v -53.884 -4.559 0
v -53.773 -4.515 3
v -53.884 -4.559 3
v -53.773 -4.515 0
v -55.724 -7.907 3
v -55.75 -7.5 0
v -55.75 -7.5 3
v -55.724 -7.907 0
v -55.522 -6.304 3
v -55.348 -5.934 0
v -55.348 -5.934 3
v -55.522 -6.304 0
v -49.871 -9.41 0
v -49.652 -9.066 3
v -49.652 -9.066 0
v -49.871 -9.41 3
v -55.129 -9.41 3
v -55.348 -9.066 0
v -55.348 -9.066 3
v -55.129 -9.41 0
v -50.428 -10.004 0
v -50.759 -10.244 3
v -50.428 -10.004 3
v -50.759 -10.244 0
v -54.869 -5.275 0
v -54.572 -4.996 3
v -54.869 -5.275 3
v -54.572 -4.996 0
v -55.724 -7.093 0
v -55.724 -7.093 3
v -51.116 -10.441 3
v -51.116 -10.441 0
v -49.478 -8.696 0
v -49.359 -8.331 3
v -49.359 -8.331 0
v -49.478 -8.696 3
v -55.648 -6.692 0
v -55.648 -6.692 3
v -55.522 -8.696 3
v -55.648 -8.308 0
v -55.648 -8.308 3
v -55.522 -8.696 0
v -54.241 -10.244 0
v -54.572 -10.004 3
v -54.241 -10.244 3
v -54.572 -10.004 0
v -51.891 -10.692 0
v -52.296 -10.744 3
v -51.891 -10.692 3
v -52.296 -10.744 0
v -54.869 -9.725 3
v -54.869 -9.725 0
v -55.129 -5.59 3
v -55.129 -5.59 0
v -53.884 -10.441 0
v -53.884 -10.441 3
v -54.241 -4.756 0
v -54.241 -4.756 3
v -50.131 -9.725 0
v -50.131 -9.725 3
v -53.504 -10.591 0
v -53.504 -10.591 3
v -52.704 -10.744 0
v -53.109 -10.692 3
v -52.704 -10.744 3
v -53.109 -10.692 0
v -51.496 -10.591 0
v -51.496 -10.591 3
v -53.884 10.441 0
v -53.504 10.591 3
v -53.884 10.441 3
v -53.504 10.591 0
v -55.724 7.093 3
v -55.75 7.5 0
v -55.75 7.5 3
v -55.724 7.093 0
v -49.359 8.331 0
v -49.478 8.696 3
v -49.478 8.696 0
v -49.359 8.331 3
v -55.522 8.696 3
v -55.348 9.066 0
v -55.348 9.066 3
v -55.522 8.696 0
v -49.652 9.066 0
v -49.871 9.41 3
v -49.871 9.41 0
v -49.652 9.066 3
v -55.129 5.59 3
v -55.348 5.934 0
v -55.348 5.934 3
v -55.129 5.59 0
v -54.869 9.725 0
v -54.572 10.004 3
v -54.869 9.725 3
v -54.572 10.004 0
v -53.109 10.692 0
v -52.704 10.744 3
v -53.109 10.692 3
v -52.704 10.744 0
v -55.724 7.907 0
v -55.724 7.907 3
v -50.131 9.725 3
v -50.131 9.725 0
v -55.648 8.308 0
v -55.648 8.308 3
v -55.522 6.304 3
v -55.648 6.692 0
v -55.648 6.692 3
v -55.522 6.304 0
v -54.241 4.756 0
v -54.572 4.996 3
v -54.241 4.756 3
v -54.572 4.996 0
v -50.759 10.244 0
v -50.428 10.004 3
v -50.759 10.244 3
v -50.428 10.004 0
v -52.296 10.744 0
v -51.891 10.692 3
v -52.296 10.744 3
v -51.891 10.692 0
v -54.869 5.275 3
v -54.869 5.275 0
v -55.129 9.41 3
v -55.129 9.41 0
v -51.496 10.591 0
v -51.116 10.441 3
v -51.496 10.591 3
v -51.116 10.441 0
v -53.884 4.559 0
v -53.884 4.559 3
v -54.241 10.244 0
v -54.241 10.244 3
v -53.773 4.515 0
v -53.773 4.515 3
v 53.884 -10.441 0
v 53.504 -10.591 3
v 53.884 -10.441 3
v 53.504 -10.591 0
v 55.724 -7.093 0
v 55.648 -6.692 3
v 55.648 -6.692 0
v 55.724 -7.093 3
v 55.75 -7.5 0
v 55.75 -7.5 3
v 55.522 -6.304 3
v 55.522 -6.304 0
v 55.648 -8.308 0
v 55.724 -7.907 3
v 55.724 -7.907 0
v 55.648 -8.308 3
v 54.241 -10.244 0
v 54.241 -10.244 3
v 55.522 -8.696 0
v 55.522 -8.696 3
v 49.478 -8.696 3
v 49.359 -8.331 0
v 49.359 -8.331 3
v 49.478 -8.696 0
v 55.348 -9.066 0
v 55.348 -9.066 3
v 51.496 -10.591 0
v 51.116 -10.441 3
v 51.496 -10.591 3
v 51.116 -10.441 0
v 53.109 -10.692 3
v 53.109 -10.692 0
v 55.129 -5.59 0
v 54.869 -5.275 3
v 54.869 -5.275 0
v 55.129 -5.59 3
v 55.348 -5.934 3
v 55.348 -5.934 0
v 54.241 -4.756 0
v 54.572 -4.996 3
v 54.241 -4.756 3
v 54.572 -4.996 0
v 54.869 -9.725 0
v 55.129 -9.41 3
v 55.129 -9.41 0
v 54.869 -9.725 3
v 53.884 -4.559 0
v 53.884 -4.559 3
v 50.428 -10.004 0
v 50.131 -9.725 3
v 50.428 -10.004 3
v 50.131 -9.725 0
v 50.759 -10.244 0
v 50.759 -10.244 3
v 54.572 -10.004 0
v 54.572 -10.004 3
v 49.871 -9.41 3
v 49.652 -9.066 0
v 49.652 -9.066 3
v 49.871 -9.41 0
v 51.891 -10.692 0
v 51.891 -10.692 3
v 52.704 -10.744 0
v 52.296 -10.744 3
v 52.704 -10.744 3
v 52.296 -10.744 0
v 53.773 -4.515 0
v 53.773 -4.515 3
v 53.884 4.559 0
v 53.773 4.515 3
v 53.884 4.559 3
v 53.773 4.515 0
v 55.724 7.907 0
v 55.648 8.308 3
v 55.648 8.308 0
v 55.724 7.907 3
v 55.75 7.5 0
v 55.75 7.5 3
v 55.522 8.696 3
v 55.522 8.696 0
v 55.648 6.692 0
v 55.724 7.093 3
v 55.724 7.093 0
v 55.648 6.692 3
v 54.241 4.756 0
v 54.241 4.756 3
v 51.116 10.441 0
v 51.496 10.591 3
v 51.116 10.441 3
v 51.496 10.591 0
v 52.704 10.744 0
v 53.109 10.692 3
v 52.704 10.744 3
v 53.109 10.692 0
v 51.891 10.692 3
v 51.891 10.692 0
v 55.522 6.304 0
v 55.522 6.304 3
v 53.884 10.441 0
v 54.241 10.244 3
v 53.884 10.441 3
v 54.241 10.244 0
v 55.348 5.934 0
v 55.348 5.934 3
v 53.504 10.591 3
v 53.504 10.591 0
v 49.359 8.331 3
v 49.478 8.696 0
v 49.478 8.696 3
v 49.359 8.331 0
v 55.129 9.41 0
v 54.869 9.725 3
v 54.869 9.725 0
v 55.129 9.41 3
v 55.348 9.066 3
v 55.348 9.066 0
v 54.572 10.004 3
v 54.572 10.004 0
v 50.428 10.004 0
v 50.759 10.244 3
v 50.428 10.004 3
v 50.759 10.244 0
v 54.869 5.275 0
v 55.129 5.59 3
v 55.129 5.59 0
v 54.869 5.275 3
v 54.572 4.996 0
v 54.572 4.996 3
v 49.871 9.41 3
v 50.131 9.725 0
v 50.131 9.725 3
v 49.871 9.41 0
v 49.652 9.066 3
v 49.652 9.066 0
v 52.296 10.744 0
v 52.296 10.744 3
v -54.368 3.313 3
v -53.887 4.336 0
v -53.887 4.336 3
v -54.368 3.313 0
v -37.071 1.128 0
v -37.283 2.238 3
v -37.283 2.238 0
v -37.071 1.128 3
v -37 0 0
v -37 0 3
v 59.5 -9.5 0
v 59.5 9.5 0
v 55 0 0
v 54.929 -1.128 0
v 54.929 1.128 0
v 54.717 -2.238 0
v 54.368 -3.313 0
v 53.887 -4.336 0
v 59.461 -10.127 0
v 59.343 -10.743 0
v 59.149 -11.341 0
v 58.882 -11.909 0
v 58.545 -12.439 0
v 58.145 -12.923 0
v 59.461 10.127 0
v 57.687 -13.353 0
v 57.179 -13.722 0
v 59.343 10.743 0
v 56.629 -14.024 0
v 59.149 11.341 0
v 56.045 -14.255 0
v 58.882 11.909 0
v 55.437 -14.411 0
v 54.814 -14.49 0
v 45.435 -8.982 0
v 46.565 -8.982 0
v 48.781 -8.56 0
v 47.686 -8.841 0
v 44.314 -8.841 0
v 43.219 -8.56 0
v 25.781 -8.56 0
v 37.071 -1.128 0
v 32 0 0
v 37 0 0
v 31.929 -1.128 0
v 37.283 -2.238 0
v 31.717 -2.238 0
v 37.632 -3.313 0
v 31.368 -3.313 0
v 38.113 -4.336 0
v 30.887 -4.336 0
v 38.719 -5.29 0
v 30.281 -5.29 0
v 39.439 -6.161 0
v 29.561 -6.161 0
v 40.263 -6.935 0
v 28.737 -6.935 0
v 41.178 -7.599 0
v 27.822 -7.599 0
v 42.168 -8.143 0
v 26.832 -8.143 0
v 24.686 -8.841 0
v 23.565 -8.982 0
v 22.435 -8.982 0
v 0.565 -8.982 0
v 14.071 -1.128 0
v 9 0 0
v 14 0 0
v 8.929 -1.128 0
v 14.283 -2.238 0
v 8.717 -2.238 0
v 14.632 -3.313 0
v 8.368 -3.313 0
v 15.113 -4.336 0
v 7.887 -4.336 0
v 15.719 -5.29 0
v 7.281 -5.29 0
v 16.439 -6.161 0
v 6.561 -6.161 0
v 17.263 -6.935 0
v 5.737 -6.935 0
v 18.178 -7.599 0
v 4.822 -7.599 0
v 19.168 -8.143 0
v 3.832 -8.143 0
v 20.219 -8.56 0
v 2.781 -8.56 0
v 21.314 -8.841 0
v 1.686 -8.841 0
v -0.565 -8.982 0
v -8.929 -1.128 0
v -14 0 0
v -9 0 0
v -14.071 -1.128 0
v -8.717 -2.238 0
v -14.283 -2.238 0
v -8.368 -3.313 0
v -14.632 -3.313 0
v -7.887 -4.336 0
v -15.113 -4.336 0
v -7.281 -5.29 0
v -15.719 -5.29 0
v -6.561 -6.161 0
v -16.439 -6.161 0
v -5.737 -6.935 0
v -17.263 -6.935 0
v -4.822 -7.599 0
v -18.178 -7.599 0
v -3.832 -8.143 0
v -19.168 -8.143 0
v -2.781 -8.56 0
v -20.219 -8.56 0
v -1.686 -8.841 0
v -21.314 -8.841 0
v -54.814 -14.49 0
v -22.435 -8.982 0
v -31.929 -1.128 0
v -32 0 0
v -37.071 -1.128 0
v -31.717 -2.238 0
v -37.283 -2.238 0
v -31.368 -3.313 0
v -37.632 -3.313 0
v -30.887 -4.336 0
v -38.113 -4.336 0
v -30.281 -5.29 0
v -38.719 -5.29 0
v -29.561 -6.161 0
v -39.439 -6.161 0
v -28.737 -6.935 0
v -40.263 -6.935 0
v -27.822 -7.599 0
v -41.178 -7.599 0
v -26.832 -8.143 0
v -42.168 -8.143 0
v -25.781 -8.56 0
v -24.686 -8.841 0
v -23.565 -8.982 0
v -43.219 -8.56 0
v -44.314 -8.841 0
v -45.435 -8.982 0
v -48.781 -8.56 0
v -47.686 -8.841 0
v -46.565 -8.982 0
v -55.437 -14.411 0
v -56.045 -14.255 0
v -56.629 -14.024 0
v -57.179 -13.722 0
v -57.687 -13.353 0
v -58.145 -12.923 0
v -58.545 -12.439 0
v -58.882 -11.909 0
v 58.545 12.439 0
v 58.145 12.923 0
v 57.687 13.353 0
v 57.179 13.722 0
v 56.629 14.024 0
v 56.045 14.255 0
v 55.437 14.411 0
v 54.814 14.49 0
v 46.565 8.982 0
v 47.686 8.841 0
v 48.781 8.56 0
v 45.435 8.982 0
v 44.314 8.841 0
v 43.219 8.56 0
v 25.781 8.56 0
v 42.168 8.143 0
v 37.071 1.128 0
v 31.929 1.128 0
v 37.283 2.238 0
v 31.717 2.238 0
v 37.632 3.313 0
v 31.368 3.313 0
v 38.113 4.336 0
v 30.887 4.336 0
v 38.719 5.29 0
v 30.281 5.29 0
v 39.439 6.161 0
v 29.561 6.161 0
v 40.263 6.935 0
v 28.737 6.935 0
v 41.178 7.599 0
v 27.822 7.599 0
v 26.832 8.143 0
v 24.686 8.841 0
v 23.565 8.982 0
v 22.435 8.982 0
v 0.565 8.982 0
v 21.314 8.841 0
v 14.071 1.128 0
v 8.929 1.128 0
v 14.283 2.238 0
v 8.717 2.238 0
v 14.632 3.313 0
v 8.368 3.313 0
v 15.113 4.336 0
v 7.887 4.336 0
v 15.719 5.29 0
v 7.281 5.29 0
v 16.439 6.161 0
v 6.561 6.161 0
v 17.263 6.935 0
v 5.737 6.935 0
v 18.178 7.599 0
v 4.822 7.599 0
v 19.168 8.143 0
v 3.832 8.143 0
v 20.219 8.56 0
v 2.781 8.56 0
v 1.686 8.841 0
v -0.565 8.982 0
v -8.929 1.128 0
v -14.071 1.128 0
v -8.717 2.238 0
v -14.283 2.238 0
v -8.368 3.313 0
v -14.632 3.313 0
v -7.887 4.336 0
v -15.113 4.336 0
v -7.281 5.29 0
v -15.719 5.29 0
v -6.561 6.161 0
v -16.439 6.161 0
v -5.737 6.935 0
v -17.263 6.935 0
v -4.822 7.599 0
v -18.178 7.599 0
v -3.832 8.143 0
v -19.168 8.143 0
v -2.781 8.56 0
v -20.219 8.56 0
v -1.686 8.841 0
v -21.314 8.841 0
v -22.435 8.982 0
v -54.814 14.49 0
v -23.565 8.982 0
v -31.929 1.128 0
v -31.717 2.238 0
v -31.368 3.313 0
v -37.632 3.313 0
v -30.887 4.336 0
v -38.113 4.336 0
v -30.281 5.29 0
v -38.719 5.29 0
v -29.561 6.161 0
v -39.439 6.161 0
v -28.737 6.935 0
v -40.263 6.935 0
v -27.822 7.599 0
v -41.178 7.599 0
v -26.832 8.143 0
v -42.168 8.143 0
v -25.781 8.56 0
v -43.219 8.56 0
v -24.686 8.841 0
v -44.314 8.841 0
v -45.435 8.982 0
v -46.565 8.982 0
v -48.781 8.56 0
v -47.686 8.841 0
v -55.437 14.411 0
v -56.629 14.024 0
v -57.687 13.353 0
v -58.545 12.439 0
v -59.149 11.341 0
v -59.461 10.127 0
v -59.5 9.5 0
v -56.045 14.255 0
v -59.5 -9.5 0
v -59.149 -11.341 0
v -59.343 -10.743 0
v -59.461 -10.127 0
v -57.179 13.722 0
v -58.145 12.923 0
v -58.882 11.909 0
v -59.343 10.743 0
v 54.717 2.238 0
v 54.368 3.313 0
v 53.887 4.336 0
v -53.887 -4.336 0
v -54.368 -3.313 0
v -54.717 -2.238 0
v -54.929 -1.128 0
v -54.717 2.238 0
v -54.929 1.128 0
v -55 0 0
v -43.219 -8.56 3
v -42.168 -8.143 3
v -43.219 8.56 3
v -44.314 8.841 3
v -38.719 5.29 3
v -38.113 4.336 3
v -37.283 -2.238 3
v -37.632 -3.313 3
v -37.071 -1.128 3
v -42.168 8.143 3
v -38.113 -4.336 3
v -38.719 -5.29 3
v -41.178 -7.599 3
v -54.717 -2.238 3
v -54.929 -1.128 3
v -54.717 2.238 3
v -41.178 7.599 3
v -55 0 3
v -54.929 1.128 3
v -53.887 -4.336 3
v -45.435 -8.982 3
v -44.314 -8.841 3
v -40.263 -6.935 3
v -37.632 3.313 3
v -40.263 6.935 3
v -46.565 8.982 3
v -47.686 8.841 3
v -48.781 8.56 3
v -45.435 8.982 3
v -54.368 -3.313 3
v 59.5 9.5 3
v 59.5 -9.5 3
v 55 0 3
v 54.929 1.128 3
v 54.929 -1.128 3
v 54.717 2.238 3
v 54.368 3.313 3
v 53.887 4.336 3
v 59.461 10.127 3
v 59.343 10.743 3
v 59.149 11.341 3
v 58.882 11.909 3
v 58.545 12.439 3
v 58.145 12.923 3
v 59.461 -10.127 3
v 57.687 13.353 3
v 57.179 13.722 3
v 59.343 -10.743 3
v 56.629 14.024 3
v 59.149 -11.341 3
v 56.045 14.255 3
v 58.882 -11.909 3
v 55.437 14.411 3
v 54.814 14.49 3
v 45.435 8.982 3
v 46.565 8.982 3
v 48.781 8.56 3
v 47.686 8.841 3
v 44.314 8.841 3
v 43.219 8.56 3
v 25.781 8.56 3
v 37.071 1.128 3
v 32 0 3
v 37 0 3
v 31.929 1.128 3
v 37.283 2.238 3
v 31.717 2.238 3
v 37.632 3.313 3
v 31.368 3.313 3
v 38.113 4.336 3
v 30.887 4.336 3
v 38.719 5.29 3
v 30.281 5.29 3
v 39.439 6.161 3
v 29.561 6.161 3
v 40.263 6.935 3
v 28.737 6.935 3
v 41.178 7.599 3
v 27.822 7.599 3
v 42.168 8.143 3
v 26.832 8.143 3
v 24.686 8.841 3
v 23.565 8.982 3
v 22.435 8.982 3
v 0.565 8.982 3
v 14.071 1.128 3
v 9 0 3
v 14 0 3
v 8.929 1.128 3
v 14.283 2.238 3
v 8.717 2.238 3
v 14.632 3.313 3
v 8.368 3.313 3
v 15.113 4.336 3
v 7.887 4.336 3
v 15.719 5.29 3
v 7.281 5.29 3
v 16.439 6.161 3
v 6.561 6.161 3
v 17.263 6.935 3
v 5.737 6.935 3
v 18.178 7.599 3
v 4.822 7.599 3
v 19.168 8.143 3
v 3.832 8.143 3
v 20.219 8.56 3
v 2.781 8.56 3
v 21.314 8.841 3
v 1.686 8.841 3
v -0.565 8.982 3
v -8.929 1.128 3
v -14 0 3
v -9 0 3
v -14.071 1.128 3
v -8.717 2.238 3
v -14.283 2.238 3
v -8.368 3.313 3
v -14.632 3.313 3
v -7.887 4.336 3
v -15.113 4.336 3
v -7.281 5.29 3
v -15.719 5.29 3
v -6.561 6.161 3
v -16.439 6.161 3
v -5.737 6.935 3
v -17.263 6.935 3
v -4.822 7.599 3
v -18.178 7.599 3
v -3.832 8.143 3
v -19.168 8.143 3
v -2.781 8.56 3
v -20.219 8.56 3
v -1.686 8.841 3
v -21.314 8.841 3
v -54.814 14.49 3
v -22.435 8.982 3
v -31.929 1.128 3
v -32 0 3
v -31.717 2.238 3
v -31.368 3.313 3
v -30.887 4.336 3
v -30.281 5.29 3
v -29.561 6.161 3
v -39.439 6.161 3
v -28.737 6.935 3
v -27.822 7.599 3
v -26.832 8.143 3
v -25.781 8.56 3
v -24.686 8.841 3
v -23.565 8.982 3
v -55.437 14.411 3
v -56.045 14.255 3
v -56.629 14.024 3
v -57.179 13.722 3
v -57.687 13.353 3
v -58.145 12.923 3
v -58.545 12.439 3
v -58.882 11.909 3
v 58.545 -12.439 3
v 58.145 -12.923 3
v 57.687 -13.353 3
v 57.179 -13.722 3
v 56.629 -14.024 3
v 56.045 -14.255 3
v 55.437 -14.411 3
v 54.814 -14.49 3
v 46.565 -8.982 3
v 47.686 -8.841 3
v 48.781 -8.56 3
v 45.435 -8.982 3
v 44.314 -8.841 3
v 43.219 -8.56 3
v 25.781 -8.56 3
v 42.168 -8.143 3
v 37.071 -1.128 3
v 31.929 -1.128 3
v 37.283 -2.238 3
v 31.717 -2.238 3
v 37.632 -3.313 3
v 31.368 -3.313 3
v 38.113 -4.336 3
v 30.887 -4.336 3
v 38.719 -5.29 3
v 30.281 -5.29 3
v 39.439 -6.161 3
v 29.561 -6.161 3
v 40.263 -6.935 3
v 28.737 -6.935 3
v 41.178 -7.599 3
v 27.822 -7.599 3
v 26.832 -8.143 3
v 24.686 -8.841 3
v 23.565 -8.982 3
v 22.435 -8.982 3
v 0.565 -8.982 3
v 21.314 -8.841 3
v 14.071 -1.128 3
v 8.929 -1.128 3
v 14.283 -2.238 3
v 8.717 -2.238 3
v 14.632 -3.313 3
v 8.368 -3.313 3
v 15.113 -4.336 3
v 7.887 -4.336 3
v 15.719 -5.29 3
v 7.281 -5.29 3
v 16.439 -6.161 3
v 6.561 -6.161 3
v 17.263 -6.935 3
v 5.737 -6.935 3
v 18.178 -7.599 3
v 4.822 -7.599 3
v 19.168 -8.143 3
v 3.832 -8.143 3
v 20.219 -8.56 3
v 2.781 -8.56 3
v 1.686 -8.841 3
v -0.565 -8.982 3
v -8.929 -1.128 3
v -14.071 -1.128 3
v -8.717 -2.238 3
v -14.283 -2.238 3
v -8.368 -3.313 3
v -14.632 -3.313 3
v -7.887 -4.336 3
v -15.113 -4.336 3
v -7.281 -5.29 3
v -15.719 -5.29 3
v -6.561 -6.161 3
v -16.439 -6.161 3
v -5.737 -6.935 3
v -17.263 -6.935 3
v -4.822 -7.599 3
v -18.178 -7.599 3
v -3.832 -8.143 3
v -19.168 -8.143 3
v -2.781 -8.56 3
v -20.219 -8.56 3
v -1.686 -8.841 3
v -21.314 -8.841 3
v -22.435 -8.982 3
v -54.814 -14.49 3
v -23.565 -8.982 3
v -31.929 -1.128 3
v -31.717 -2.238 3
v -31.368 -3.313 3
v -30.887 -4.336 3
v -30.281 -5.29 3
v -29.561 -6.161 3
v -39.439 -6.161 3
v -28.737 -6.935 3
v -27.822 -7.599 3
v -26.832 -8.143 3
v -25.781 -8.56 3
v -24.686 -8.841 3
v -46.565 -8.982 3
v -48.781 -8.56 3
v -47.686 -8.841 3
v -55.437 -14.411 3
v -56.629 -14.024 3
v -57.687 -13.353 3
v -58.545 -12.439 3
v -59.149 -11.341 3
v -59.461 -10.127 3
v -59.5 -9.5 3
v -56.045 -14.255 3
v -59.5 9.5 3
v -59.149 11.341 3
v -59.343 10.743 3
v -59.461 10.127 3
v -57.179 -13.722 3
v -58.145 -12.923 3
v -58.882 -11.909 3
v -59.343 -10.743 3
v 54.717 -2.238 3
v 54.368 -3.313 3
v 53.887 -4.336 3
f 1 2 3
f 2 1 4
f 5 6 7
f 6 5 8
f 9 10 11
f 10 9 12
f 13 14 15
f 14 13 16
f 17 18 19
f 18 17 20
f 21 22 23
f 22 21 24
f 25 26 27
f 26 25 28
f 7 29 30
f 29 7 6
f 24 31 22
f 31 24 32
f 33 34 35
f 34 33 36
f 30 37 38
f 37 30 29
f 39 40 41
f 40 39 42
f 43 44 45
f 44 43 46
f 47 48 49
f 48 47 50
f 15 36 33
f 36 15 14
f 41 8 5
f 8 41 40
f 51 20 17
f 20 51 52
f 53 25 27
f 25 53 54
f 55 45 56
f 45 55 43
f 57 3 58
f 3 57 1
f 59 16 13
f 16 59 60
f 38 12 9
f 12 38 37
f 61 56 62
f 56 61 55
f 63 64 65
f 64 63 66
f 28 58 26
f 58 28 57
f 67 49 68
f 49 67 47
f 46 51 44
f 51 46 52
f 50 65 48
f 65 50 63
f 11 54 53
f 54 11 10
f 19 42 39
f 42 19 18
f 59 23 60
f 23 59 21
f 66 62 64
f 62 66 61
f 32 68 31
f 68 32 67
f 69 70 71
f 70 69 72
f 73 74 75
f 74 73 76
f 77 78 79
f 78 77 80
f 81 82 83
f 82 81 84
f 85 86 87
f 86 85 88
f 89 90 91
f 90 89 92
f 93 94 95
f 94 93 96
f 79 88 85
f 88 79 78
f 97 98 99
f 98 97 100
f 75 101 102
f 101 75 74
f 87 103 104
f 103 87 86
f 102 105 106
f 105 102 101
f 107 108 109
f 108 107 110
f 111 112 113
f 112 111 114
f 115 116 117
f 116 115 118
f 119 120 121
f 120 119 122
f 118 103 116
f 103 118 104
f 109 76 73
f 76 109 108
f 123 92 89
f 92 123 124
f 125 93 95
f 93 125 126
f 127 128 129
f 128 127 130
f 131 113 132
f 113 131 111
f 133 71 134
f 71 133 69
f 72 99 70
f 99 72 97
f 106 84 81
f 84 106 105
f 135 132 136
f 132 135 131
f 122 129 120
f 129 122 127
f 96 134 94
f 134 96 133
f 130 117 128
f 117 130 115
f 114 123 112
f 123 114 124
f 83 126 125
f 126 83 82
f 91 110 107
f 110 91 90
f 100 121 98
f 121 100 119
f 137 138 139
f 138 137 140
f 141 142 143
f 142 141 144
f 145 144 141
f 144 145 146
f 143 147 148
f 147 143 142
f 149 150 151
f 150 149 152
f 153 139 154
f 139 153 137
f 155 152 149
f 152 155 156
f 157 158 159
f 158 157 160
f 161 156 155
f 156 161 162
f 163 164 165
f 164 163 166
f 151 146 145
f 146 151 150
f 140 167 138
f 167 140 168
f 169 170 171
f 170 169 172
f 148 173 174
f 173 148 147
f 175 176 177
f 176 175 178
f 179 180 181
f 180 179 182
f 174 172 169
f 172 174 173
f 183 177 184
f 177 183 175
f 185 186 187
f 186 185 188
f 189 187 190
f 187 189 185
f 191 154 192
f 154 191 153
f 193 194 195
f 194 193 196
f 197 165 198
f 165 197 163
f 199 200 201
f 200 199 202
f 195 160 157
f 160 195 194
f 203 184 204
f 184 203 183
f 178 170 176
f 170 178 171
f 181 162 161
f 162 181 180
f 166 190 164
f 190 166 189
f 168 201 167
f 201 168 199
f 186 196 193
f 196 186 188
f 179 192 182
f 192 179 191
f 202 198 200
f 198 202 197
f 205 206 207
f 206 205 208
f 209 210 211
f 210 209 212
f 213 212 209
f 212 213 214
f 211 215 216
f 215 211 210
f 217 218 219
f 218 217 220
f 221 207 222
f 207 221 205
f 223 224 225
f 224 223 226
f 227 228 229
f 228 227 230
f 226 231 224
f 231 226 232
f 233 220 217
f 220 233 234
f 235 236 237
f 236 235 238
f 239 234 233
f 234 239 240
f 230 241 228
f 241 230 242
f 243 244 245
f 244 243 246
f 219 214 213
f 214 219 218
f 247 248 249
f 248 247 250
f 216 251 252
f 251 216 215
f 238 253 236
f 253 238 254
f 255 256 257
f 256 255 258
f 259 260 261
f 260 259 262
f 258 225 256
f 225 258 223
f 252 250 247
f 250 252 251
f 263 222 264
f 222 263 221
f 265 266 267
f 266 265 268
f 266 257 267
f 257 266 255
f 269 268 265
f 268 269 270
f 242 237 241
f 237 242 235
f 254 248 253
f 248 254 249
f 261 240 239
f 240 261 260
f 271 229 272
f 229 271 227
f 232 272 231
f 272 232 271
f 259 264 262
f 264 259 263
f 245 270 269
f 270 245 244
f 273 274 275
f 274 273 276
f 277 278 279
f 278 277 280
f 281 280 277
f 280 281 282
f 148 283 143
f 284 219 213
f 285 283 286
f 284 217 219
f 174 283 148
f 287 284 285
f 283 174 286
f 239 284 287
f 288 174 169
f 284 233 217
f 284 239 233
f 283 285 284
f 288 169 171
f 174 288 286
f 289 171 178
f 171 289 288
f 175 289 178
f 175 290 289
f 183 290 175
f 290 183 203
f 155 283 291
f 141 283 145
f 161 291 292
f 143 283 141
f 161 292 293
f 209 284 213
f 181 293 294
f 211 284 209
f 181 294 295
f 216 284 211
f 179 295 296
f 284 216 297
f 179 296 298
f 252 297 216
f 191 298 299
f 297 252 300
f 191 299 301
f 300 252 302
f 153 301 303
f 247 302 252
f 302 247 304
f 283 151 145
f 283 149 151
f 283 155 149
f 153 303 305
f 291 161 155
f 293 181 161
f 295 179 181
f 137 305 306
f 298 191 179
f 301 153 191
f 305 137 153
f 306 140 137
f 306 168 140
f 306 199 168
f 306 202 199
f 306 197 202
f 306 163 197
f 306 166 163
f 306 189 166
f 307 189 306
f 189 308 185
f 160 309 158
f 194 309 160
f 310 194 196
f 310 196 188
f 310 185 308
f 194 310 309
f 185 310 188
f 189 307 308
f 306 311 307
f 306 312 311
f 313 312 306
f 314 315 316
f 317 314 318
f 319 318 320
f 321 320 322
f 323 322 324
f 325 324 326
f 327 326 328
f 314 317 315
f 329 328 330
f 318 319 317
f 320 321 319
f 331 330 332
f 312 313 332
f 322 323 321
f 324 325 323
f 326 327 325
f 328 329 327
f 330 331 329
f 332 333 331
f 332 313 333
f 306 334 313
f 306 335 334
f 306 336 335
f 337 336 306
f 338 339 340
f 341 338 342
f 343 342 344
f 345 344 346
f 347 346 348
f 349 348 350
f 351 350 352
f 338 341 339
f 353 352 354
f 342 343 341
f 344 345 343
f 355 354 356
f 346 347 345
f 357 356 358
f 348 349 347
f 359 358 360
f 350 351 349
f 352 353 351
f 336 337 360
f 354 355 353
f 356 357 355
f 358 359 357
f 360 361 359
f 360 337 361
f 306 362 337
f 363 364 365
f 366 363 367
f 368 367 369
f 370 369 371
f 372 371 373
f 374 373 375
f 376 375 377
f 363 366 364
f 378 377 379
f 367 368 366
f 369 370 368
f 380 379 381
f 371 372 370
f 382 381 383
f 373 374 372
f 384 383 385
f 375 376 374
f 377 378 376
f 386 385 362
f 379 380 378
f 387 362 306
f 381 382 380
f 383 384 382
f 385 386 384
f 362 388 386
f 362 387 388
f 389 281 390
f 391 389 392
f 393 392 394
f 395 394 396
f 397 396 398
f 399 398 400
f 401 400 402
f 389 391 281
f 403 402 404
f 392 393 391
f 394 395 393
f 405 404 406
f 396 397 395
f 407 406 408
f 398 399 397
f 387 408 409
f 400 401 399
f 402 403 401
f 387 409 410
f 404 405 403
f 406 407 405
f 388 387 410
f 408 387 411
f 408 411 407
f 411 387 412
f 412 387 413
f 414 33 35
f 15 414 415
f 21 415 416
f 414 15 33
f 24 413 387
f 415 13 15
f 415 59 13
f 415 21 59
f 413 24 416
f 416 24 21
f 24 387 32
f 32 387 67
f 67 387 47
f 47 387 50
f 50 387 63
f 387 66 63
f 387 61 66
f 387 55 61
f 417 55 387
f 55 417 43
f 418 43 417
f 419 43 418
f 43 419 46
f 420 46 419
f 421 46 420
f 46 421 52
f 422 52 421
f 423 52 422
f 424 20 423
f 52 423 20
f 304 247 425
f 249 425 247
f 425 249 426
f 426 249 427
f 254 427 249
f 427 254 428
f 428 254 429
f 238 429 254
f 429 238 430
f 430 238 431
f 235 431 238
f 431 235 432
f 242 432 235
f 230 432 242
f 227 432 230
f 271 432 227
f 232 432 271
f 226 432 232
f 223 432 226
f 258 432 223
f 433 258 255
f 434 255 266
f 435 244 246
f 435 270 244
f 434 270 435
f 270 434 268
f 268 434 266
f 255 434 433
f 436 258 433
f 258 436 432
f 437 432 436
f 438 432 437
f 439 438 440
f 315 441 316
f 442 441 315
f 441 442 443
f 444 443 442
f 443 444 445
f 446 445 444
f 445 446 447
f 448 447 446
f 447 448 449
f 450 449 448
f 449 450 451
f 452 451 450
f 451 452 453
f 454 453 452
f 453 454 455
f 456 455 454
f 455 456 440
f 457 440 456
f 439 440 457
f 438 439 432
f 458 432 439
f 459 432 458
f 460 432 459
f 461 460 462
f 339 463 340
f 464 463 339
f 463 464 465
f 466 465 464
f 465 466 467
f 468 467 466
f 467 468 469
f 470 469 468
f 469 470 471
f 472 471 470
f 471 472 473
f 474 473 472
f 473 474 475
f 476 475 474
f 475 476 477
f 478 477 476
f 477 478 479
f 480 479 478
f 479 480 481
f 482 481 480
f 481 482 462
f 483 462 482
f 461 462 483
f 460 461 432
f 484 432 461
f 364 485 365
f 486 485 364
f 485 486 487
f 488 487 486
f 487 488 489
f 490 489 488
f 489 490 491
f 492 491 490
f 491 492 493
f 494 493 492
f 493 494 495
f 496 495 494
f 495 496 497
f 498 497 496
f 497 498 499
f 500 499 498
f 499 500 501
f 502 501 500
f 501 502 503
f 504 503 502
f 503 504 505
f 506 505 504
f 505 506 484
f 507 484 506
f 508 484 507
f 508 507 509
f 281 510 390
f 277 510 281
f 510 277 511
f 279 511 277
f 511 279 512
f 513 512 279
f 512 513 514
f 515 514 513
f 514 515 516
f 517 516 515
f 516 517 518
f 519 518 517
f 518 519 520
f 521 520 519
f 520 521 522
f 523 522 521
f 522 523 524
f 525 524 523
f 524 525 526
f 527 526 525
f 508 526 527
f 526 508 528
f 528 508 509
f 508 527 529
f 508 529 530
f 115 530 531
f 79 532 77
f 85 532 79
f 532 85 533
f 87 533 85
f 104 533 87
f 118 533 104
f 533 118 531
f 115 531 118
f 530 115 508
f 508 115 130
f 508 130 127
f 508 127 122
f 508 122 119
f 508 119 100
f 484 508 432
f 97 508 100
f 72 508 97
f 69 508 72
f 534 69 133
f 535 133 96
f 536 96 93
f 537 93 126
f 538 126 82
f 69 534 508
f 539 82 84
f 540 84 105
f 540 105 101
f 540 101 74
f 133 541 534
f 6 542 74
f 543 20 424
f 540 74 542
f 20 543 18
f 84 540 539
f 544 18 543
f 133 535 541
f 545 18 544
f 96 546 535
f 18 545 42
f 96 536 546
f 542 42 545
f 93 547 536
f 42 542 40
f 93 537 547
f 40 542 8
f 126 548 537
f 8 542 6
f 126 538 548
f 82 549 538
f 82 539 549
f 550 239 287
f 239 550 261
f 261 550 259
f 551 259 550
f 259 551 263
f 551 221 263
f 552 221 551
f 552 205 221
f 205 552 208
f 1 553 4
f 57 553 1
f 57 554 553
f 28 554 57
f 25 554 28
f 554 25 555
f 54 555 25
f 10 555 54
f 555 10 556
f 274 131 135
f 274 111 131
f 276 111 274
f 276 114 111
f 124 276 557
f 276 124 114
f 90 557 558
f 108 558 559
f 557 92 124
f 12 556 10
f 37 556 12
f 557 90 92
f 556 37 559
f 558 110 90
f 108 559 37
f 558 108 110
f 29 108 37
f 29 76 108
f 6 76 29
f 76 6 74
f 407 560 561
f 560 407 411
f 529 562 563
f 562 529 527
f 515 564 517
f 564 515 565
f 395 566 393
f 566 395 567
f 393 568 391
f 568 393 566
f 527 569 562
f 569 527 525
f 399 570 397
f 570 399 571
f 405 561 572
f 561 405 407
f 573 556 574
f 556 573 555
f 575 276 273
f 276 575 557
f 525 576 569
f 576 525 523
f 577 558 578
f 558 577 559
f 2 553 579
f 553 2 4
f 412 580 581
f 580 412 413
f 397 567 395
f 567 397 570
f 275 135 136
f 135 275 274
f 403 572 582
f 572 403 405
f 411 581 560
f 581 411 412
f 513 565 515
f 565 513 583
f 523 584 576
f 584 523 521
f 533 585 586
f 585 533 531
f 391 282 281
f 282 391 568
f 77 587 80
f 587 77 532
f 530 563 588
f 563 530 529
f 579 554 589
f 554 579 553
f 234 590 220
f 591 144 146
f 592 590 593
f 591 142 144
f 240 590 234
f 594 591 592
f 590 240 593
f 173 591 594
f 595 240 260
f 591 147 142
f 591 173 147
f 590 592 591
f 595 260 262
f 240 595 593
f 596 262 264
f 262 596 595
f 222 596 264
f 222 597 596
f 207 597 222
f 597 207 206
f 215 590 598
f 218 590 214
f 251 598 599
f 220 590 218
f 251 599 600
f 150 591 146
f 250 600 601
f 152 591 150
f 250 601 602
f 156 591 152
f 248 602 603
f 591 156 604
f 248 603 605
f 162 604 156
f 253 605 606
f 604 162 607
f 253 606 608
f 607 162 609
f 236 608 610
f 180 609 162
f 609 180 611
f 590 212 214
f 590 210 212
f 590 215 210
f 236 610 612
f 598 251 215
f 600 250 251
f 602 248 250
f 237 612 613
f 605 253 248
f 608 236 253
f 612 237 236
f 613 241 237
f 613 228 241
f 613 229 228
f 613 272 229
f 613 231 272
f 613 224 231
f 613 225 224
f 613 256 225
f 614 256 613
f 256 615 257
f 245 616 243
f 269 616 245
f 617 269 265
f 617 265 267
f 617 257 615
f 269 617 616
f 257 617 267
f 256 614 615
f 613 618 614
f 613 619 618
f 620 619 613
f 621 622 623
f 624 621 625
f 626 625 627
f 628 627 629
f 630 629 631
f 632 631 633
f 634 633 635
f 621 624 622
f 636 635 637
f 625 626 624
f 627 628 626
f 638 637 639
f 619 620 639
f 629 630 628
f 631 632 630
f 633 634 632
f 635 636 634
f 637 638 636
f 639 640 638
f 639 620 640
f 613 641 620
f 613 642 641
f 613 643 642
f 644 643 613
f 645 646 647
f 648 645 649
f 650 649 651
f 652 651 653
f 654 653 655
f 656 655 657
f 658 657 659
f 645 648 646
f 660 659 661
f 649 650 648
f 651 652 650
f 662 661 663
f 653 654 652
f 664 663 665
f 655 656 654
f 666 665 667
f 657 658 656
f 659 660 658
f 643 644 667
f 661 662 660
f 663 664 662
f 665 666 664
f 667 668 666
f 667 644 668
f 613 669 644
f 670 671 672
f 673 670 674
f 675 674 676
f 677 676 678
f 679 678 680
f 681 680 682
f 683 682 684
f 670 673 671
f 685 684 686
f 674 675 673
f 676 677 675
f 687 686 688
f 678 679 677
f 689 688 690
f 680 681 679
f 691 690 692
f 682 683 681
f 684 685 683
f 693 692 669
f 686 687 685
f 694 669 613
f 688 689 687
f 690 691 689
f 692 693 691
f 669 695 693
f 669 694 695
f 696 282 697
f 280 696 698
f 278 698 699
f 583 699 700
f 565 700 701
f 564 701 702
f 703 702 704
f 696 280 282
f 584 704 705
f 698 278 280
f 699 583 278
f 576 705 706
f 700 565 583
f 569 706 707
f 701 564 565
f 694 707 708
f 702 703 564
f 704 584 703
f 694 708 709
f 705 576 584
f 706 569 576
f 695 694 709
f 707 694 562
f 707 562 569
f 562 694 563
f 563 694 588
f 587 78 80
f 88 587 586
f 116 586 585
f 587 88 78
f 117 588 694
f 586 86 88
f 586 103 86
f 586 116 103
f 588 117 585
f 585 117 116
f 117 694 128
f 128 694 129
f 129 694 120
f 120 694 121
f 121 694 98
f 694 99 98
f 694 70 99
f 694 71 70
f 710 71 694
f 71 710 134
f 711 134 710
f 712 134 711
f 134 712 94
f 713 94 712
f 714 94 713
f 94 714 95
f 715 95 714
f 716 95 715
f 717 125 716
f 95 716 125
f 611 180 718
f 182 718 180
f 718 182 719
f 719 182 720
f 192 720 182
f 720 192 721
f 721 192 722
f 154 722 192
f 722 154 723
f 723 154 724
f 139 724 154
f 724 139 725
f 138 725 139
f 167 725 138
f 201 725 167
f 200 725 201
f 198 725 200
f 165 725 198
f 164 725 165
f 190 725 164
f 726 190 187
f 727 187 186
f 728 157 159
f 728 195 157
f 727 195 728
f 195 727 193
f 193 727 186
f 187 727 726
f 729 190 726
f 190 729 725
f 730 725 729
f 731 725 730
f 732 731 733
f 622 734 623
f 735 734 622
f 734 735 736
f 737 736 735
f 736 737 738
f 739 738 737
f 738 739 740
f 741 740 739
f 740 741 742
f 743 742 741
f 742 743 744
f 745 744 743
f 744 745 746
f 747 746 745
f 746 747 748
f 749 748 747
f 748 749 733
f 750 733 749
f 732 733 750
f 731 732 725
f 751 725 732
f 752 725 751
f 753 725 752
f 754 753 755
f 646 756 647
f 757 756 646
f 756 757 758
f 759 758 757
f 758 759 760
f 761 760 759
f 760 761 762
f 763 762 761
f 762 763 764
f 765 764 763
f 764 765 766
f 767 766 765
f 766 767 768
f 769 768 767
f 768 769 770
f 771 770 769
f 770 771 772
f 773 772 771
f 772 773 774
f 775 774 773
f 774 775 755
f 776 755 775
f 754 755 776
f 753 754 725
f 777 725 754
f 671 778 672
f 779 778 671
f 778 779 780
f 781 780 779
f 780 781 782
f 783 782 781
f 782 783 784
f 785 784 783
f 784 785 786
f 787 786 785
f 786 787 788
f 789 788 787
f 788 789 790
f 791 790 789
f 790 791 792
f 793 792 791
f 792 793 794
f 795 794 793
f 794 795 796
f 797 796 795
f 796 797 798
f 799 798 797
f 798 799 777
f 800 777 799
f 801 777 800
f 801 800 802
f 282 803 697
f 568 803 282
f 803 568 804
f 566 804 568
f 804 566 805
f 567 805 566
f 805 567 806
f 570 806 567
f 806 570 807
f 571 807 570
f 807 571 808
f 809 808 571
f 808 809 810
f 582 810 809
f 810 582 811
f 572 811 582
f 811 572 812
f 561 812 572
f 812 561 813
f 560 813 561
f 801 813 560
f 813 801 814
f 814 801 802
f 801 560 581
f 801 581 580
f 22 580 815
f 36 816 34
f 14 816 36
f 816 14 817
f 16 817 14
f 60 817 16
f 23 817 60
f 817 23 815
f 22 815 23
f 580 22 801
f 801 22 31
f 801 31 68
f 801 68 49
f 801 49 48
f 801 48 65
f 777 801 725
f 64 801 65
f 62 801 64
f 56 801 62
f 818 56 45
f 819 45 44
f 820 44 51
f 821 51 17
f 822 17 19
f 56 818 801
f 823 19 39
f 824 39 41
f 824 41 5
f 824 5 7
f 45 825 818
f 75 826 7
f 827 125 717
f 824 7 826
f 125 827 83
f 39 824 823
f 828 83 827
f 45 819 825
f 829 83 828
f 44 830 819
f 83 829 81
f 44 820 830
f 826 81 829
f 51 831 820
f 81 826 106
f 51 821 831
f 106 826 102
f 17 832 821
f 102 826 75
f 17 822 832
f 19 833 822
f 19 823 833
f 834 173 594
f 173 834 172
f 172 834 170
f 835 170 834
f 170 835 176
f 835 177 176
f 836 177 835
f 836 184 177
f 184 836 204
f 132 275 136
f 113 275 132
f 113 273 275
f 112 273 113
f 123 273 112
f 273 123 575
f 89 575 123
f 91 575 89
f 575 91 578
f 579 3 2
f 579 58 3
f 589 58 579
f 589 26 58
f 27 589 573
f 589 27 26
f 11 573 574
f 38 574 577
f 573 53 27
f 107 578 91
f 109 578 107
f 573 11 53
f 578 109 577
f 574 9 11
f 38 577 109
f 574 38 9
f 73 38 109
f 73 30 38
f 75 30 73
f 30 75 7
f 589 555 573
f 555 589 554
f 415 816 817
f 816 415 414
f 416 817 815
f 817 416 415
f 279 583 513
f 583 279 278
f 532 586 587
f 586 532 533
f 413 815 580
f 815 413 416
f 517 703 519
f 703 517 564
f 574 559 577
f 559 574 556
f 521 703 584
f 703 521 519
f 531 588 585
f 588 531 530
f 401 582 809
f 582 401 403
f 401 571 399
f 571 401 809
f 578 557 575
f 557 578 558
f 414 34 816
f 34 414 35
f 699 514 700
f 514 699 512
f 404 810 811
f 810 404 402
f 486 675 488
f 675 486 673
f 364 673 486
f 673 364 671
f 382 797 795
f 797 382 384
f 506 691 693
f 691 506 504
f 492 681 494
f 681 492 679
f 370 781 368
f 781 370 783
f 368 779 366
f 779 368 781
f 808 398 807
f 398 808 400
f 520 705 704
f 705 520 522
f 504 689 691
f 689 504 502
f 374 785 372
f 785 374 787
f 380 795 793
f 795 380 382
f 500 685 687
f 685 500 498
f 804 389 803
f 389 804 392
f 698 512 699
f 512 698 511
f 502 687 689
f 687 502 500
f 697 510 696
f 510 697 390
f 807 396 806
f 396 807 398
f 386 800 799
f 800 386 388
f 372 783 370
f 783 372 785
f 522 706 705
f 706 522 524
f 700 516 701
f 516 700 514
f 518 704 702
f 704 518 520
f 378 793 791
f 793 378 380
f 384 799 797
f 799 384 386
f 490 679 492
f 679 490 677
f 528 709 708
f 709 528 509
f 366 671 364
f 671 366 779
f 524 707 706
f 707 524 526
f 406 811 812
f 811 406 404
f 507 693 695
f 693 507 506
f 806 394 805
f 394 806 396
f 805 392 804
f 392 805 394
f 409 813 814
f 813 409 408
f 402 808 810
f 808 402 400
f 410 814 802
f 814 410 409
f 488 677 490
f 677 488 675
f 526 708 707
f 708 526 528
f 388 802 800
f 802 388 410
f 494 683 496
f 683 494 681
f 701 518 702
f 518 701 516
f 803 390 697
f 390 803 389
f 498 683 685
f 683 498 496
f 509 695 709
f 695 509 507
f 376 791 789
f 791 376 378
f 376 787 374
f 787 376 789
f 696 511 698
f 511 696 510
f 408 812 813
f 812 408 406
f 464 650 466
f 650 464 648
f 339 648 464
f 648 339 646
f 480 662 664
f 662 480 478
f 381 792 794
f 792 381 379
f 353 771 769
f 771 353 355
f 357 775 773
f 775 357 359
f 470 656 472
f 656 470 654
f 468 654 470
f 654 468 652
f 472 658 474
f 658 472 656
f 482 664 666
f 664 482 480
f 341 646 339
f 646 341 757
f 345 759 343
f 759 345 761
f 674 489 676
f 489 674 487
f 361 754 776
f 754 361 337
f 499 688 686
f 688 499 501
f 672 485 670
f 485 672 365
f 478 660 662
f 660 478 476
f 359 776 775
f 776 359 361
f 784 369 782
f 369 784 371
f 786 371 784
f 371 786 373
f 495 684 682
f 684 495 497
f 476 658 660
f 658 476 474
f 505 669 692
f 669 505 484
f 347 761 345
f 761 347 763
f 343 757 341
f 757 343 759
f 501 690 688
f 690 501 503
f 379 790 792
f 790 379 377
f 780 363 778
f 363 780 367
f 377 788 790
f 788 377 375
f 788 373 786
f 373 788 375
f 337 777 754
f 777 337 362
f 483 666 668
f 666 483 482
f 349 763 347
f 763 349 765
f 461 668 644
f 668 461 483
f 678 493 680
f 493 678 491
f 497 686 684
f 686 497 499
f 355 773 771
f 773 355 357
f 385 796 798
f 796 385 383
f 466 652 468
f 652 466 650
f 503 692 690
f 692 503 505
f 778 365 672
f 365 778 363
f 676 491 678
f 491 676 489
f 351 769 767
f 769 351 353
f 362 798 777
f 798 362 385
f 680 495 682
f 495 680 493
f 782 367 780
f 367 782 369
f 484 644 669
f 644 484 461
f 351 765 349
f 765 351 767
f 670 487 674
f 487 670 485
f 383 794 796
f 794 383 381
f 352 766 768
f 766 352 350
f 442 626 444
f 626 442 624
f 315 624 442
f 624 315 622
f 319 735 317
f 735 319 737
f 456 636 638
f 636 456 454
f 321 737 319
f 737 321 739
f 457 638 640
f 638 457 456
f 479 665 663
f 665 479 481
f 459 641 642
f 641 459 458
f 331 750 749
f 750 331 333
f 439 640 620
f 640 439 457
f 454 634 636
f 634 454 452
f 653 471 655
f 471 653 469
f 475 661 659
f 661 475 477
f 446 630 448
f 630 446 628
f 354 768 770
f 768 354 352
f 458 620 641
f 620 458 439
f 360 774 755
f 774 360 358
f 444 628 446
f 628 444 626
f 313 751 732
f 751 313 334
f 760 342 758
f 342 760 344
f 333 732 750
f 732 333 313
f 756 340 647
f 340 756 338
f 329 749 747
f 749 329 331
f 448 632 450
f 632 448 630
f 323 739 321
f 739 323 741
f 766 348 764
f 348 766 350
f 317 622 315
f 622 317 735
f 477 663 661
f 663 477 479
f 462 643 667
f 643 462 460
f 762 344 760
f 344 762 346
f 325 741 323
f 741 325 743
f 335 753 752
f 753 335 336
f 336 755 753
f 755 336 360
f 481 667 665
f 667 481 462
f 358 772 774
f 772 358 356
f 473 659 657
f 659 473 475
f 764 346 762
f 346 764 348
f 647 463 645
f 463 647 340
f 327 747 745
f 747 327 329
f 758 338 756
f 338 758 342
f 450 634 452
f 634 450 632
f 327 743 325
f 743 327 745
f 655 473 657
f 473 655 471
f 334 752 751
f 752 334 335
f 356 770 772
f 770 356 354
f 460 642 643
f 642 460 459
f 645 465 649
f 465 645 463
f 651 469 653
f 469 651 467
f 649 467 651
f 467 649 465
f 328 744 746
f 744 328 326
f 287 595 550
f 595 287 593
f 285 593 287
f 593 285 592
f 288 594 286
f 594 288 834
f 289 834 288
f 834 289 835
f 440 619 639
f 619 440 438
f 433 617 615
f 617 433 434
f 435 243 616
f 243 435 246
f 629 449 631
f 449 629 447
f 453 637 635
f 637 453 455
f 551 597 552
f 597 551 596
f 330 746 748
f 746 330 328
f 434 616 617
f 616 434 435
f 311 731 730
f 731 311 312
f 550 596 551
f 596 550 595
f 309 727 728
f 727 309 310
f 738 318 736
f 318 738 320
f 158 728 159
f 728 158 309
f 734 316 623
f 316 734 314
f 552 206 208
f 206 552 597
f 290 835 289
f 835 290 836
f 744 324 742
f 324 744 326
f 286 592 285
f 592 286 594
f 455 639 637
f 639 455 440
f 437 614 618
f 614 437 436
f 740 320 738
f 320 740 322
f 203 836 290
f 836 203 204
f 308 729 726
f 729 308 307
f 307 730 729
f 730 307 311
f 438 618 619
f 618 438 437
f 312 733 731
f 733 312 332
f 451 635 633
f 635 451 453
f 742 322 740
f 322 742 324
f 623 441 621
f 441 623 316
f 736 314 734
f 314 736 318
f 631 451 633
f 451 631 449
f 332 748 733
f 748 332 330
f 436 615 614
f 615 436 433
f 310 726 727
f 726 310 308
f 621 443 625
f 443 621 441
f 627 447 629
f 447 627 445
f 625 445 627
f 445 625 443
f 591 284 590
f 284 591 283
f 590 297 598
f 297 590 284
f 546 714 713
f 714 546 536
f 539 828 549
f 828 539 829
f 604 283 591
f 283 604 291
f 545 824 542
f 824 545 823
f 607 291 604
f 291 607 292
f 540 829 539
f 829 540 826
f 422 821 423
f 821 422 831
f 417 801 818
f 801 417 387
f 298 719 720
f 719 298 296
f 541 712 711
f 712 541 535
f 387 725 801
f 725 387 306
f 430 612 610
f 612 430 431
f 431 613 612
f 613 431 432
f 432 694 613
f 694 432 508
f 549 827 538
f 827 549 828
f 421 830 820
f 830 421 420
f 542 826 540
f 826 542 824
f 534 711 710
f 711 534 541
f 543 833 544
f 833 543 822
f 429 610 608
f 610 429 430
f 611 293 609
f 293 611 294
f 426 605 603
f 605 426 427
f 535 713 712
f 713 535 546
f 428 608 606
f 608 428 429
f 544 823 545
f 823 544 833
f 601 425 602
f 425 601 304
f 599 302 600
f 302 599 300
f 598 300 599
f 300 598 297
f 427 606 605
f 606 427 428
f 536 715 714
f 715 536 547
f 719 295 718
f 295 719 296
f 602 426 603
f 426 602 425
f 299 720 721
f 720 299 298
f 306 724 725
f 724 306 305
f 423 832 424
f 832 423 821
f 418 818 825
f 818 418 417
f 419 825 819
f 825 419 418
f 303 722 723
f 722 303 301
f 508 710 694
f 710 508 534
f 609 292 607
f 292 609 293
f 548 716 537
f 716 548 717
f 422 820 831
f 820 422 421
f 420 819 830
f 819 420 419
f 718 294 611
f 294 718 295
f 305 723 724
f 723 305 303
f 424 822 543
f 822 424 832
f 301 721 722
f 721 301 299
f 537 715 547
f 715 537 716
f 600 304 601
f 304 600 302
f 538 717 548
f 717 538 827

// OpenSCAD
$fn = 50;

difference() {
	union() {
		hull() {
			translate(v = [-54.5, 9.5, 0]) {
				cylinder(h = 3, r = 5);
			}
			translate(v = [54.5, 9.5, 0]) {
				cylinder(h = 3, r = 5);
			}
			translate(v = [-54.5, -9.5, 0]) {
				cylinder(h = 3, r = 5);
			}
			translate(v = [54.5, -9.5, 0]) {
				cylinder(h = 3, r = 5);
			}
		}
	}
	union() {
		translate(v = [-52.5, -7.5, -100.0]) {
			cylinder(h = 200, r = 3.25);
		}
		translate(v = [-52.5, 7.5, -100.0]) {
			cylinder(h = 200, r = 3.25);
		}
		translate(v = [52.5, -7.5, -100.0]) {
			cylinder(h = 200, r = 3.25);
		}
		translate(v = [52.5, 7.5, -100.0]) {
			cylinder(h = 200, r = 3.25);
		}
		translate(v = [-52.5, -7.5, -100.0]) {
			cylinder(h = 200, r = 1.8);
		}
		translate(v = [-52.5, 7.5, -100.0]) {
			cylinder(h = 200, r = 1.8);
		}
		translate(v = [52.5, -7.5, -100.0]) {
			cylinder(h = 200, r = 1.8);
		}
		translate(v = [52.5, 7.5, -100.0]) {
			cylinder(h = 200, r = 1.8);
		}
		translate(v = [-46.0, 0, 0.0]) {
			cylinder(h = 3, r = 9.0);
		}
		translate(v = [-23.0, 0, 0.0]) {
			cylinder(h = 3, r = 9.0);
		}
		cylinder(h = 3, r = 9.0);
		translate(v = [23.0, 0, 0.0]) {
			cylinder(h = 3, r = 9.0);
		}
		translate(v = [46.0, 0, 0.0]) {
			cylinder(h = 3, r = 9.0);
		}
	}
}
